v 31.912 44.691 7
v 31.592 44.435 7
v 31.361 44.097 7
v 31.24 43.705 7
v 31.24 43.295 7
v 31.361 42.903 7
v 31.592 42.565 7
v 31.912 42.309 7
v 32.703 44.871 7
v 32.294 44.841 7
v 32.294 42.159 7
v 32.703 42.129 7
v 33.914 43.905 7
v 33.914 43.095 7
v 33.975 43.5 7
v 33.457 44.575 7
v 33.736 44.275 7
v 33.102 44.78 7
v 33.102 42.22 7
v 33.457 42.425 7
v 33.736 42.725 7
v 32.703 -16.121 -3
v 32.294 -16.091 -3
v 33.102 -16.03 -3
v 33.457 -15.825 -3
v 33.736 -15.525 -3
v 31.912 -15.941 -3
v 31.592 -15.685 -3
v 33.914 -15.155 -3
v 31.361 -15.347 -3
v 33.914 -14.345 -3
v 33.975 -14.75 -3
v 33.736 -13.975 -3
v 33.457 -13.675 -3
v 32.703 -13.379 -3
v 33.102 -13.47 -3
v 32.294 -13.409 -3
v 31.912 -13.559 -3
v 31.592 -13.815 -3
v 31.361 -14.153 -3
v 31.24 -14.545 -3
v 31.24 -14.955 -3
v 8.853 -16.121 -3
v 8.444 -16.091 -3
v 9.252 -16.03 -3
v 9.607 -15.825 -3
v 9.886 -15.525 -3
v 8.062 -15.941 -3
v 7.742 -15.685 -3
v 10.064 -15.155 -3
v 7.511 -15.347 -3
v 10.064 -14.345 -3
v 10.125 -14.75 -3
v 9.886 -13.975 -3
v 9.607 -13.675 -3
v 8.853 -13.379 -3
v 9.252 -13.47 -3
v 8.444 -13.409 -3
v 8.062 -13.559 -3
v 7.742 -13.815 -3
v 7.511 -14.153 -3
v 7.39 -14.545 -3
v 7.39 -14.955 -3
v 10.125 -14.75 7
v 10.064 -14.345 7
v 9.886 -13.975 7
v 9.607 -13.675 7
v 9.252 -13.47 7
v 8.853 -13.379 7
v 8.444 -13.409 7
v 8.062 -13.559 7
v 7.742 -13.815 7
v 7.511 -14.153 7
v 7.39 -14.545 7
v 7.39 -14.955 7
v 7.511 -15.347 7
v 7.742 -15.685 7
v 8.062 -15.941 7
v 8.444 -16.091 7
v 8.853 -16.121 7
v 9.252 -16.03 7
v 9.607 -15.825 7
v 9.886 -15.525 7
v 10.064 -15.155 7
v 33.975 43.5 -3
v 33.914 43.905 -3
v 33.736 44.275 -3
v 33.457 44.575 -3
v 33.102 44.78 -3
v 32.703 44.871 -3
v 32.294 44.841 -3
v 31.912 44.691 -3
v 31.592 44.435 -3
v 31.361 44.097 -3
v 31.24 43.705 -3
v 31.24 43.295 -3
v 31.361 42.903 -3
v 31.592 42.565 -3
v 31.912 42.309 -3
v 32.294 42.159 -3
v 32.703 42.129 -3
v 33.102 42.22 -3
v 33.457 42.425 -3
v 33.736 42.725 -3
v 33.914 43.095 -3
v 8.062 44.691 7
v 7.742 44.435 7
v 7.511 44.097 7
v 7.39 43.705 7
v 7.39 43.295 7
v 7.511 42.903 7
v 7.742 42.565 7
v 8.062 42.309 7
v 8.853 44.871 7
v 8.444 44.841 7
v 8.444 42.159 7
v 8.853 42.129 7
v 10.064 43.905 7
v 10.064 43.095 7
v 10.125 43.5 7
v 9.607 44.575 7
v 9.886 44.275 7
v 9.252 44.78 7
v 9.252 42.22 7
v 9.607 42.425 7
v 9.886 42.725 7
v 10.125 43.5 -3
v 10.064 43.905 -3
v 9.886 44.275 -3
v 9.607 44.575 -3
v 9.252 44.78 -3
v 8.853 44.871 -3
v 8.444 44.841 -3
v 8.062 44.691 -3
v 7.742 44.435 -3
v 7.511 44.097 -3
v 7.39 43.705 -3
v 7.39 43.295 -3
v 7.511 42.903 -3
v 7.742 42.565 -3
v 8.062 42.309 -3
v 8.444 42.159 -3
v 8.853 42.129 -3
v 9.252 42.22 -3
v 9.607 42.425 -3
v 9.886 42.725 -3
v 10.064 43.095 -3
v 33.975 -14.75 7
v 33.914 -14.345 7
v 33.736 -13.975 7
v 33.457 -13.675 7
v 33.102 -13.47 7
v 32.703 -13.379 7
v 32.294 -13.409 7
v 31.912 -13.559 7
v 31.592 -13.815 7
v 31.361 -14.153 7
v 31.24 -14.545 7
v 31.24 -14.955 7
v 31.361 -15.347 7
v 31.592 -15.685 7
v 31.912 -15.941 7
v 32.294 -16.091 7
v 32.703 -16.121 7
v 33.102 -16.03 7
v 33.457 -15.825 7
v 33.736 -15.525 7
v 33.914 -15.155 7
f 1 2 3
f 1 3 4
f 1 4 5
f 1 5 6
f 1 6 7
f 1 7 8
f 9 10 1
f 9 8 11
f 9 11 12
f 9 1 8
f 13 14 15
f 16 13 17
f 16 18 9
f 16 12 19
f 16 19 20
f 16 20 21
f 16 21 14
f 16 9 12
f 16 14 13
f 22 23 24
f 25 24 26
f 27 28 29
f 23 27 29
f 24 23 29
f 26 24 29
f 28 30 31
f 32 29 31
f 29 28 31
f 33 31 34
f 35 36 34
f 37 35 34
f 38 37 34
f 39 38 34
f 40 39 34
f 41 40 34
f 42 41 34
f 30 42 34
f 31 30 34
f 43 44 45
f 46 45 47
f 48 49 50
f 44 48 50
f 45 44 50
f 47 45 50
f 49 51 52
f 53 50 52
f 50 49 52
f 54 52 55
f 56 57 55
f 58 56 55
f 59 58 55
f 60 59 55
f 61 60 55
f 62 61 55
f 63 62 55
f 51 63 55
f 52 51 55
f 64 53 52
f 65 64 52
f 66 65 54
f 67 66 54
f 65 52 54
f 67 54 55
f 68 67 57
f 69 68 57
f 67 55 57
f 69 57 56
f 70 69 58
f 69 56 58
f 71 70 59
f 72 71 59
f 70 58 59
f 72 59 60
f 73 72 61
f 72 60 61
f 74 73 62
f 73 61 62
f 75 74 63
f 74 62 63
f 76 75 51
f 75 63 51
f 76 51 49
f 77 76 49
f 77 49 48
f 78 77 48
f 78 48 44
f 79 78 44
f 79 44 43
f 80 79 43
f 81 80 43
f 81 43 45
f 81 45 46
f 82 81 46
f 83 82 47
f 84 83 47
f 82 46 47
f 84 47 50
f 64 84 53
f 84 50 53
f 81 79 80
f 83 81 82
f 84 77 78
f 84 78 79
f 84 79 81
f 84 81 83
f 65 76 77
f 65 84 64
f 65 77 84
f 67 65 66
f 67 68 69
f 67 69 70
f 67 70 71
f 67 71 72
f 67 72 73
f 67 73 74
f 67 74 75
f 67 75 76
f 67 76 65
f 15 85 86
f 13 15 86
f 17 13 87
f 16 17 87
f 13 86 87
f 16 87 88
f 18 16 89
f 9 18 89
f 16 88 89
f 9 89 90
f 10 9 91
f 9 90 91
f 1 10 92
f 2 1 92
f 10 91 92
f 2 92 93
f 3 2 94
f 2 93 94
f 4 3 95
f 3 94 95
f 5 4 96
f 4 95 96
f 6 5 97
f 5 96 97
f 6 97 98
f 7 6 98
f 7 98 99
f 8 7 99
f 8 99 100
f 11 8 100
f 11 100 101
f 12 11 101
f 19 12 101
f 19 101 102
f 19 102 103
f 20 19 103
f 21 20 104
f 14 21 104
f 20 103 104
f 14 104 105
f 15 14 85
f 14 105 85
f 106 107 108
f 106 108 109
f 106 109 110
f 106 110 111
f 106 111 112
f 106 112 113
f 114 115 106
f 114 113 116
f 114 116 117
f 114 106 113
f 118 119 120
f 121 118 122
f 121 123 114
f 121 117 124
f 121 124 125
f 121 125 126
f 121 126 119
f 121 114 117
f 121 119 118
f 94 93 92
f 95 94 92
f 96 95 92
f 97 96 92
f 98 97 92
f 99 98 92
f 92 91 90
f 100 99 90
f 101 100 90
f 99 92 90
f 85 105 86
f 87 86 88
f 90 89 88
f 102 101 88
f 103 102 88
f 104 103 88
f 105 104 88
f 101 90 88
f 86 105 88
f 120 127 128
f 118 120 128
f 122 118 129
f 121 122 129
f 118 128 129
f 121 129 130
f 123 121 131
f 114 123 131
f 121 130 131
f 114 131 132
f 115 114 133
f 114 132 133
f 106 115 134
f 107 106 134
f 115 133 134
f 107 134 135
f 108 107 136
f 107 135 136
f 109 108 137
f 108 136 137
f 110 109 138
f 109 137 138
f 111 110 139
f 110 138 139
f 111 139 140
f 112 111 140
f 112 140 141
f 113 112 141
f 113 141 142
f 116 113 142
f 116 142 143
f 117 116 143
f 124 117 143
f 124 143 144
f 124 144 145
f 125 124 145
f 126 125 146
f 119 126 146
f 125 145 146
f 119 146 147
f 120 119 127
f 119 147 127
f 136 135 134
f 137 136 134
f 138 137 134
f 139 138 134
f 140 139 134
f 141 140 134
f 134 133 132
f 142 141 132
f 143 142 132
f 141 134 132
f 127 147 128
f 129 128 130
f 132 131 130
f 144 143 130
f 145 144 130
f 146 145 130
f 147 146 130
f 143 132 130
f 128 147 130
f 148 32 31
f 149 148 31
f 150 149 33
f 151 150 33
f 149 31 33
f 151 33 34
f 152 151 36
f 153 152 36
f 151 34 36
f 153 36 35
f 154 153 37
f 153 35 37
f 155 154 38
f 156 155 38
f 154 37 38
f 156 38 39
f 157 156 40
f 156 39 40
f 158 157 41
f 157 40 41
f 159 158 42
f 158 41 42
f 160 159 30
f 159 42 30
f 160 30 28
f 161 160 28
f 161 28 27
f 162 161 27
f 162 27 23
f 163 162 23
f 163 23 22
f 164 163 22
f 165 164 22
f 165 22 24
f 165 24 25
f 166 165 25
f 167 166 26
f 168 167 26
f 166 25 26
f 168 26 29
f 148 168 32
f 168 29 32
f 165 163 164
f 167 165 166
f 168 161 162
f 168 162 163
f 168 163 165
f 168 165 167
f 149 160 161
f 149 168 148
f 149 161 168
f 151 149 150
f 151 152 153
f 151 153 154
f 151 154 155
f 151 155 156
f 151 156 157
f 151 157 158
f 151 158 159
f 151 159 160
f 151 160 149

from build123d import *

# Parameters (mm, degrees)
CYLINDER002_R     = 1.375
CYLINDER002_DEPTH = 10
CYLINDER003_R     = 1.375
CYLINDER003_DEPTH = 10
CYLINDER004_R     = 1.375
CYLINDER004_DEPTH = 10
CYLINDER001_R     = 1.375
CYLINDER001_DEPTH = 10


with BuildPart() as cylinder002:
    # Cylinder002 → Cylinder002 (new body)
    with BuildSketch(Plane(origin=(32.6, 43.5, -3), x_dir=(1, 0, 0), z_dir=(0, 0, 1))):
        Circle(CYLINDER002_R)
    extrude(amount=CYLINDER002_DEPTH)


with BuildPart() as cylinder003:
    # Cylinder003 → Cylinder003 (new body)
    with BuildSketch(Plane(origin=(32.6, -14.75, -3), x_dir=(1, 0, 0), z_dir=(0, 0, 1))):
        Circle(CYLINDER003_R)
    extrude(amount=CYLINDER003_DEPTH)


with BuildPart() as cylinder004:
    # Cylinder004 → Cylinder004 (new body)
    with BuildSketch(Plane(origin=(8.75, -14.75, -3), x_dir=(1, 0, 0), z_dir=(0, 0, 1))):
        Circle(CYLINDER004_R)
    extrude(amount=CYLINDER004_DEPTH)


with BuildPart() as hole_cuts:
    # Cylinder001 → Cylinder001 (new body)
    with BuildSketch(Plane(origin=(8.75, 43.5, -3), x_dir=(1, 0, 0), z_dir=(0, 0, 1))):
        Circle(CYLINDER001_R)
    extrude(amount=CYLINDER001_DEPTH)

    # Fusion002003002: union Cylinder002, Cylinder003, Cylinder004
    add(cylinder002.part)
    add(cylinder003.part)
    add(cylinder004.part)


solid = hole_cuts.part
